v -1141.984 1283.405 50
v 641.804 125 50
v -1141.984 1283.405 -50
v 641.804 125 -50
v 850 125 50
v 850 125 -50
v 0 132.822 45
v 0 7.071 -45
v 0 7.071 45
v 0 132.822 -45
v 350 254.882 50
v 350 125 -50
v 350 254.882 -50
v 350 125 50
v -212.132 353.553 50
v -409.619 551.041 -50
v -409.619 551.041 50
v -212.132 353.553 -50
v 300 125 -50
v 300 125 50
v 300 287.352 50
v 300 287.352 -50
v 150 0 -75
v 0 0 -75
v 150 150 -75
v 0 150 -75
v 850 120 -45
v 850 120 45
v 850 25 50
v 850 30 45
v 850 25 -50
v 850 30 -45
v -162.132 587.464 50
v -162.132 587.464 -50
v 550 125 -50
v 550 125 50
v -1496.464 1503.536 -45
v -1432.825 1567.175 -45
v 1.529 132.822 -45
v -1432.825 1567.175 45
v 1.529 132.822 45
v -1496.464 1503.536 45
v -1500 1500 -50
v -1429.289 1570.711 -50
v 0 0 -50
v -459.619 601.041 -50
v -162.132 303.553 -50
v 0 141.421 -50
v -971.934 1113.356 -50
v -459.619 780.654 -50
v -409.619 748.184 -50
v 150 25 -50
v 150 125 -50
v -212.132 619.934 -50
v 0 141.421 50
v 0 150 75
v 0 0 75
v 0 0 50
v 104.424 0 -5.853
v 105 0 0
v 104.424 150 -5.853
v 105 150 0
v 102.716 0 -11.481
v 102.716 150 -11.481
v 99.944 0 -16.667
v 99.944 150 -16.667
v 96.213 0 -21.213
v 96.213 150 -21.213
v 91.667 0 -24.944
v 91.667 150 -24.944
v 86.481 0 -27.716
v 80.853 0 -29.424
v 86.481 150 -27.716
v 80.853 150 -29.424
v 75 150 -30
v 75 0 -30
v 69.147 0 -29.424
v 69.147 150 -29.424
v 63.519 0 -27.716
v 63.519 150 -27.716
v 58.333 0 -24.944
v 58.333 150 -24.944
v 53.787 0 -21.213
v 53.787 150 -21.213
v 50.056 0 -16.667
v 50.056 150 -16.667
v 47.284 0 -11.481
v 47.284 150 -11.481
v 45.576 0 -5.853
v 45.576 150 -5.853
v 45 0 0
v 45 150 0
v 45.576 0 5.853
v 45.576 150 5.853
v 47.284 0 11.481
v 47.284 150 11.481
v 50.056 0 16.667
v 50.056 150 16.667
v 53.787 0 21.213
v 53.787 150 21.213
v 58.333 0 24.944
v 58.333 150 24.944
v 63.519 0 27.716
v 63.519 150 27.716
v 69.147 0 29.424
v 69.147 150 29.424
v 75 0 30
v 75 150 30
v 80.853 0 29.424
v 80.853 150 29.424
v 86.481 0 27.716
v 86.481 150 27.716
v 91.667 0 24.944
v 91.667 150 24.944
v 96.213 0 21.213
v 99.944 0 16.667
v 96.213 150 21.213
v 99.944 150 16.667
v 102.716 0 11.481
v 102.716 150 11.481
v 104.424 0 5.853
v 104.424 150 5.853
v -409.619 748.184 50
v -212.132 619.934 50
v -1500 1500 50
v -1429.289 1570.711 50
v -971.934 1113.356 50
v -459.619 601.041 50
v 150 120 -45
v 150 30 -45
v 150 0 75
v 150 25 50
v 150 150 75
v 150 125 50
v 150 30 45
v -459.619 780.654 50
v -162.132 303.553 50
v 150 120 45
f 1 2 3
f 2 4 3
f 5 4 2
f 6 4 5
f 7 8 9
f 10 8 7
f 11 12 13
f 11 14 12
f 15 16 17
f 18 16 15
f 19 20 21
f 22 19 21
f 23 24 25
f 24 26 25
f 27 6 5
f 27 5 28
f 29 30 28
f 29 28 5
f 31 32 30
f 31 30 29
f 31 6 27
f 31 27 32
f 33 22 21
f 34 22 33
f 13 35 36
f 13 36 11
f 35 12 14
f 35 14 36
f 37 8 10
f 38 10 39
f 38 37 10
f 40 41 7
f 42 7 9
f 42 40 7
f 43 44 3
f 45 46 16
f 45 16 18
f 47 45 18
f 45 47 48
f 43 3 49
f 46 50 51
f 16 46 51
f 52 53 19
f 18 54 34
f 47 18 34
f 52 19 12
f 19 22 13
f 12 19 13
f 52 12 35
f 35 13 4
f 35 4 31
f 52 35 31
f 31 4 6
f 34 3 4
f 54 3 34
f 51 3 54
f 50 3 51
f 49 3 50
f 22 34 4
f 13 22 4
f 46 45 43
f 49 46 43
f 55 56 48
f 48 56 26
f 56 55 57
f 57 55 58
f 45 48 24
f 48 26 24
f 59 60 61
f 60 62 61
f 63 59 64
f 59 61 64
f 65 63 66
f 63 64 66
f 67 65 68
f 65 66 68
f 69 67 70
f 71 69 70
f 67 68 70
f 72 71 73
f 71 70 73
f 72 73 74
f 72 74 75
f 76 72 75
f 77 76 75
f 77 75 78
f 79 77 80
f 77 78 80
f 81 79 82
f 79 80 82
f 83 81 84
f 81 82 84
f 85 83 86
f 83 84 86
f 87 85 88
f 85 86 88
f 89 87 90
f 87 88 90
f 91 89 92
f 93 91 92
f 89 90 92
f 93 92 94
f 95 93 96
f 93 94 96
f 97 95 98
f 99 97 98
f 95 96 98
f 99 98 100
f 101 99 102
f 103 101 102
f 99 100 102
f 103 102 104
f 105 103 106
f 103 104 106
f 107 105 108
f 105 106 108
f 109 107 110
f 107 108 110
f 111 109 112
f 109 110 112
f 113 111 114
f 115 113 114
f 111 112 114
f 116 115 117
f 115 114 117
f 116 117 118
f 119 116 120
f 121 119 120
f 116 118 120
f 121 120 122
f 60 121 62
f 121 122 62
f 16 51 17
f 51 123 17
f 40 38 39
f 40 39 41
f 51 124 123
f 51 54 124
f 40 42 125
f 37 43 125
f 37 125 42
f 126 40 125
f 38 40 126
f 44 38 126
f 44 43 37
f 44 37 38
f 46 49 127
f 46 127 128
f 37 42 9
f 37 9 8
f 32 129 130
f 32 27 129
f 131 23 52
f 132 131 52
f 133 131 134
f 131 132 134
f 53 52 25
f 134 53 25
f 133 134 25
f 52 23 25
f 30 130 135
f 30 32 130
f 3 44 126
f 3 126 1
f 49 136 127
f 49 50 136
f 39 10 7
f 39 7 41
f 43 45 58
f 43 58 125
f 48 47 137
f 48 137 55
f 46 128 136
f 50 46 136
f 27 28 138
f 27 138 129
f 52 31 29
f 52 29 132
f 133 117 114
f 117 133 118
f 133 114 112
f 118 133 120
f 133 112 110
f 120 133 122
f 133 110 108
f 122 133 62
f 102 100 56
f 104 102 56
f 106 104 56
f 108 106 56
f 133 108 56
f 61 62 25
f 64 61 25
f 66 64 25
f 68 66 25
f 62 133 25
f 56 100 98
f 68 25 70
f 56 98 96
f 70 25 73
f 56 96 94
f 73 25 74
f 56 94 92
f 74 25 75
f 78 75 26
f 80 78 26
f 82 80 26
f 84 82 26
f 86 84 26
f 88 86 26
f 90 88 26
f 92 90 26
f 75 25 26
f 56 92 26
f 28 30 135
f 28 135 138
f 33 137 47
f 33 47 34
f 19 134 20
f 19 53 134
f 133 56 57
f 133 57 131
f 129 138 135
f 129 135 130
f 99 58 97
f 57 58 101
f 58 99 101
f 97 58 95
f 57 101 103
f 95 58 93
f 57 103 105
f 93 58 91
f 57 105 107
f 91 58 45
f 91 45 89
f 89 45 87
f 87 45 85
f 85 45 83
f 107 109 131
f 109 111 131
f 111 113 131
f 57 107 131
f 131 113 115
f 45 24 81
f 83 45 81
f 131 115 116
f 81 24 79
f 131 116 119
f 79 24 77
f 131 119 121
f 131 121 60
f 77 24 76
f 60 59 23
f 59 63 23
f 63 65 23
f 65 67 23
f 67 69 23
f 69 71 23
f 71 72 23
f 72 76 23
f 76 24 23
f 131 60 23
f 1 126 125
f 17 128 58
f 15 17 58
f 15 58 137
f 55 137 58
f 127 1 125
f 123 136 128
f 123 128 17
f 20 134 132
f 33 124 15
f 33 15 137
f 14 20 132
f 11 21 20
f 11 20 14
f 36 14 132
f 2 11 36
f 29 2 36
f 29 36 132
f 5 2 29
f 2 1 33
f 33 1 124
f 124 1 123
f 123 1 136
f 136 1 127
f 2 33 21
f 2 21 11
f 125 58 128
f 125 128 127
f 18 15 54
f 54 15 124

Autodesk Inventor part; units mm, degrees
ref_plane "YZ Plane" through (0, 0, 0) normal (1, 0, 0) x (0, 1, 0)
ref_plane "XZ Plane" through (0, 0, 0) normal (0, 1, 0) x (-1, 0, 0)
ref_plane "XY Plane" through (0, 0, 0) normal (0, 0, 1) x (1, 0, 0)
sketch "Sketch1" plane through (0, 0, 0) normal (0, 0, 1) x (1, 0, 0)
  line L0 (0, 0) -> (150, 0)
  line L1 (150, 0) -> (150, 150)
  line L2 (150, 150) -> (0, 150)
  line L3 (0, 150) -> (0, 0)
  line L4 (0, 0) -> (-1500, 1500)
  line L5 (-1500, 1500) -> (-1429.2893, 1570.7107)
  line L6 (-1429.2893, 1570.7107) -> (0, 141.4214)
  line L7 (0, 141.4214) -> (0, 0)
  line L8 (150, 100) -> (150, 0)
  line L9 (150, 0) -> (150, 125)
  line L10 (150, 125) -> (850, 125)
  line L11 (850, 125) -> (850, 25)
  line L12 (850, 25) -> (150, 25)
  line L13 (150, 25) -> (150, 125)
  dimension "d0" = 150
  dimension "d1" = 150
  dimension "d8" = 1500
  dimension "d9" = 100
  dimension "d12" = 125
  dimension "d13" = 700
  dimension "d14" = 100
extrude "Extrusion3" add sketch "Sketch1" along normal mid plane 150 contours L3 L2 L1 L0
sketch "Sketch3" plane through (0, 0, 0) normal (0, 0, 1) x (1, 0, 0)
  line L0 (0, 0) -> (-1500, 1500)
  line L1 (0, 0) -> (2121.3203, 0) construction
  line L2 (-1500, 1500) -> (-1429.2893, 1570.7107)
  line L3 (-1429.2893, 1570.7107) -> (0, 141.4214)
  line L4 (0, 0) -> (0, 141.4214)
  line L5 (150, 0) -> (150, 125)
  line L6 (150, 125) -> (850, 125)
  line L7 (850, 125) -> (850, 25)
  line L8 (850, 25) -> (150, 25)
  line L9 (150, 25) -> (150, 125)
  dimension "d17" = 135
  dimension "d18" = 1500
  dimension "d19" = 100
  dimension "d20" = 125
  dimension "d21" = 700
  dimension "d22" = 100
extrude "Extrusion4" add sketch "Sketch3" along normal mid plane 100
sketch "Sketch4" plane through (-1500, 1500, -50) normal (-0.7071, 0.7071, 0) x (-0.7071, -0.7071, 0)
  line L0 (-95, 95) -> (-5, 95)
  line L1 (-5, 95) -> (-5, 5)
  line L2 (-5, 5) -> (-95, 5)
  line L3 (-95, 5) -> (-95, 95)
  line L4 (-95, 95) -> (-5, 5) construction
  line L5 (-5, 95) -> (-95, 5) construction
  point P0 (0, 50)
  point P1 (-50, 50)
  dimension "d25" = 90
  dimension "d26" = 90
extrude "Extrusion5" cut sketch "Sketch4" against normal blind 2122.5
sketch "Sketch5" plane through (0, 0, 0) normal (0, 0, 1) x (1, 0, 0)
  line L0 (0, 132.8216) -> (69.0672, 132.8216)
  line L1 (69.0672, 132.8216) -> (69.0672, 2.6564)
  line L2 (69.0672, 2.6564) -> (0, 2.6564)
  line L3 (0, 2.6564) -> (0, 132.8216)
  point P0 (0, 0)
extrude "Extrusion6" add sketch "Sketch5" along normal mid plane 100.5
sketch "Sketch6" plane through (0, 0, 0) normal (0, 0, 1) x (1, 0, 0)
  point P0 (0, 0)
sketch "Sketch7" plane through (0, 150, 75) normal (0, 1, 0) x (1, 0, 0)
  circle A0 centre (75, 75) radius 30
  point P0 (0, 75)
  dimension "d31" = 60
extrude "Extrusion7" cut sketch "Sketch7" against normal blind 340
sketch "Sketch8" plane through (850, 25, 50) normal (1, 0, 0) x (0, 0, -1)
  line L0 (5, 95) -> (95, 95)
  line L1 (95, 95) -> (95, 5)
  line L2 (95, 5) -> (5, 5)
  line L3 (5, 5) -> (5, 95)
  line L4 (5, 95) -> (95, 5) construction
  line L5 (95, 95) -> (5, 5) construction
  point P0 (50, -25)
  point P1 (50, 50)
  dimension "d34" = 90
  dimension "d35" = 90
extrude "Extrusion8" cut sketch "Sketch8" against normal blind 700
sketch "Sketch9" plane through (0, 0, 0) normal (0, 0, 1) x (1, 0, 0)
  point P0 (0, 0)
sketch "Sketch10" plane through (0, 0, 0) normal (0, 0, 1) x (1, 0, 0)
  line L0 (150, 125) -> (550, 125)
  line L1 (550, 125) -> (-971.9923, 1113.3934)
  line L2 (550, 125) -> (2376.4621, 125) construction
  line L3 (550, 125) -> (641.8039, 125)
  line L4 (641.8039, 125) -> (-1142.0421, 1283.4431)
  line L5 (-971.9923, 1113.3934) -> (-1142.0421, 1283.4431)
  line L6 (-971.9923, 1113.3934) -> (-731.5056, 1113.3934) construction
  line L7 (150, 125) -> (300, 125)
  point P0 (0, 0)
  dimension "d41" = 147
  dimension "d42" = 50
  dimension "d43" = 400
  dimension "d44" = 135
  dimension "d45" = 150
extrude "Extrusion9" add sketch "Sketch10" along normal mid plane 100
sketch "Sketch11" plane through (0, 0, 50) normal (0, 0, 1) x (1, 0, 0)
  line L0 (0, 141.4214) -> (-971.9344, 1113.3558) projected
  line L1 (-971.9344, 1113.3558) -> (550, 125) projected
  line L2 (550, 125) -> (150, 125) projected
  line L3 (150, 125) -> (300, 125)
  line L4 (300, 125) -> (300, 287.3519)
  line L5 (300, 125) -> (350, 125)
  line L6 (350, 125) -> (350, 254.8815)
  line L7 (300, 287.3519) -> (350, 254.8815)
  line L8 (305, 130) -> (305, 278.143)
  line L9 (0, 141.4214) -> (-212.132, 353.5534)
  line L10 (-212.132, 353.5534) -> (-247.4874, 388.9087)
  line L11 (-93.5014, 542.8947) -> (-50.6311, 515.0544)
  line L12 (0, 141.4214) -> (-459.6194, 601.0408)
  line L13 (-459.6194, 601.0408) -> (-494.9747, 636.3961)
  line L14 (-212.132, 353.5534) -> (-212.132, 619.9343)
  line L15 (-162.132, 303.5534) -> (-162.132, 587.464)
  line L16 (-212.132, 353.5534) -> (-175.196, 316.6173)
  line L17 (-212.132, 619.9343) -> (-162.132, 587.464)
  line L18 (-459.6194, 601.0408) -> (-459.6194, 780.6545)
  line L19 (-409.6194, 748.1841) -> (-409.6194, 551.0408)
  line L20 (-409.6194, 551.0408) -> (-459.6194, 601.0408)
  line L21 (-409.6194, 551.0408) -> (-459.6194, 601.0408)
  line L22 (-459.6194, 601.0408) -> (-409.6194, 551.0408)
  line L23 (-459.6194, 780.6545) -> (-409.6194, 748.1841)
  dimension "d48" = 150
  dimension "d49" = 50
  dimension "d51" = 300
  dimension "d52" = 50
  dimension "d54" = 650
  dimension "d55" = 50
  dimension "d71" = 50
  dimension "d72" = 50
sketch "Sketch13" plane through (0, 0, 50) normal (0, 0, 1) x (1, 0, 0)
  line L0 (-314.5783, 746.0819) -> (-298.0455, 762.6147) projected
  line L1 (-333.4008, 797.97) -> (-298.0455, 762.6147) projected
  line L2 (-357.4486, 773.9222) -> (-333.4008, 797.97) projected
  line L3 (-971.9344, 1113.3558) -> (550, 125) projected
  line L4 (-314.5783, 746.0819) -> (-357.4486, 773.9222)
  line L5 (-333.4008, 797.97) -> (-298.0455, 762.6147)
  line L6 (-298.0455, 762.6147) -> (-314.5783, 746.0819)
  line L7 (-333.4008, 797.97) -> (-357.4486, 773.9222)
  point P0 (-393.5938, 737.777)
extrude "Extrusion11" cut sketch "Sketch13" against normal blind 228.5
sketch "Sketch16" plane through (0, 0, 0) normal (0, 0, 1) x (1, 0, 0)
  point P0 (0, 0)
extrude "Extrusion13" add sketch "Sketch11" against normal blind 100 contours L1 L6 L2 L4 | L0 L14 L1 L15 | L19 L0 L18 L1
properties part number "kepala baru" material "Steel, Mild"
